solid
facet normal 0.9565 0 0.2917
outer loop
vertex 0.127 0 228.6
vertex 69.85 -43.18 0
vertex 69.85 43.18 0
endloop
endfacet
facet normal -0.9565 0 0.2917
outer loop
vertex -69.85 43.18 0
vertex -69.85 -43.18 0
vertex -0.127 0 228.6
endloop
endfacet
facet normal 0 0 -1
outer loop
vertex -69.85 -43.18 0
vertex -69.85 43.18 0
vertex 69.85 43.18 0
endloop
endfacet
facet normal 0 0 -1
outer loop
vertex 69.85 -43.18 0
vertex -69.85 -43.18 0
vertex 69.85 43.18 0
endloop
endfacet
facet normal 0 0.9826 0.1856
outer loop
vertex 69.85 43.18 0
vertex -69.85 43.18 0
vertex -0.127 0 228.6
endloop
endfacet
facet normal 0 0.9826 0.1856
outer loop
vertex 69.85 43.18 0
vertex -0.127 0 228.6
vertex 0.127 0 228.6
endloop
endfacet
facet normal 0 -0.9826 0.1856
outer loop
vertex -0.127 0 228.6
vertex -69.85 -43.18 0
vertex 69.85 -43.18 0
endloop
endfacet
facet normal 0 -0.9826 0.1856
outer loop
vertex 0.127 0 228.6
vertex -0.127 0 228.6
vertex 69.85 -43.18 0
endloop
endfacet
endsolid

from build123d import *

# Parameters (mm, degrees)
F0_W       = 139.7
F0_H       = 86.36
F1_DEPTH   = 228.6
F2_SIZE2   = 69.72299
F2_SIZE    = 228.59999
F2_2_SIZE2 = 69.72299
F2_2_SIZE  = 228.59999
F3_SIZE2   = 228.59999
F3_SIZE    = 43.17999


# Not quite as in the source:
# - a fillet or chamfer is up to 0.001 mm smaller than in the source, because OpenCascade refuses the exact size


with BuildPart() as f1:
    # F0 (on Top) → F1 (new body)
    with BuildSketch(Plane.XY):
        Rectangle(F0_W, F0_H)
    extrude(amount=F1_DEPTH)

    # F2 (size 228.6 and 69.723 in the source; OpenCascade refuses exactly that, so slightly less here)
    f2_edges = [f1.edges().sort_by_distance(p)[0] for p in [
        (69.85, 0, 228.6),
    ]]
    f2_side = f1.faces().sort_by_distance((69.85, 0, 114.3))[0]
    chamfer(f2_edges, length=F2_SIZE, length2=F2_SIZE2, reference=f2_side)

    # F2#2 (size 228.6 and 69.723 in the source; OpenCascade refuses exactly that, so slightly less here)
    f2_2_edges = [f1.edges().sort_by_distance(p)[0] for p in [
        (-69.85, 0, 228.6),
    ]]
    f2_2_side = f1.faces().sort_by_distance((-69.85, 0, 114.3))[0]
    chamfer(f2_2_edges, length=F2_2_SIZE, length2=F2_2_SIZE2, reference=f2_2_side)

    # F3 (size 43.18 and 228.6 in the source; OpenCascade refuses exactly that, so slightly less here)
    f3_edges = [f1.edges().sort_by_distance(p)[0] for p in [
        (0, -43.18, 228.6),
        (0, 43.18, 228.6),
    ]]
    f3_side = f1.faces().sort_by_distance((0, 0, 228.6))[0]
    chamfer(f3_edges, length=F3_SIZE, length2=F3_SIZE2, reference=f3_side)


solid = f1.part
